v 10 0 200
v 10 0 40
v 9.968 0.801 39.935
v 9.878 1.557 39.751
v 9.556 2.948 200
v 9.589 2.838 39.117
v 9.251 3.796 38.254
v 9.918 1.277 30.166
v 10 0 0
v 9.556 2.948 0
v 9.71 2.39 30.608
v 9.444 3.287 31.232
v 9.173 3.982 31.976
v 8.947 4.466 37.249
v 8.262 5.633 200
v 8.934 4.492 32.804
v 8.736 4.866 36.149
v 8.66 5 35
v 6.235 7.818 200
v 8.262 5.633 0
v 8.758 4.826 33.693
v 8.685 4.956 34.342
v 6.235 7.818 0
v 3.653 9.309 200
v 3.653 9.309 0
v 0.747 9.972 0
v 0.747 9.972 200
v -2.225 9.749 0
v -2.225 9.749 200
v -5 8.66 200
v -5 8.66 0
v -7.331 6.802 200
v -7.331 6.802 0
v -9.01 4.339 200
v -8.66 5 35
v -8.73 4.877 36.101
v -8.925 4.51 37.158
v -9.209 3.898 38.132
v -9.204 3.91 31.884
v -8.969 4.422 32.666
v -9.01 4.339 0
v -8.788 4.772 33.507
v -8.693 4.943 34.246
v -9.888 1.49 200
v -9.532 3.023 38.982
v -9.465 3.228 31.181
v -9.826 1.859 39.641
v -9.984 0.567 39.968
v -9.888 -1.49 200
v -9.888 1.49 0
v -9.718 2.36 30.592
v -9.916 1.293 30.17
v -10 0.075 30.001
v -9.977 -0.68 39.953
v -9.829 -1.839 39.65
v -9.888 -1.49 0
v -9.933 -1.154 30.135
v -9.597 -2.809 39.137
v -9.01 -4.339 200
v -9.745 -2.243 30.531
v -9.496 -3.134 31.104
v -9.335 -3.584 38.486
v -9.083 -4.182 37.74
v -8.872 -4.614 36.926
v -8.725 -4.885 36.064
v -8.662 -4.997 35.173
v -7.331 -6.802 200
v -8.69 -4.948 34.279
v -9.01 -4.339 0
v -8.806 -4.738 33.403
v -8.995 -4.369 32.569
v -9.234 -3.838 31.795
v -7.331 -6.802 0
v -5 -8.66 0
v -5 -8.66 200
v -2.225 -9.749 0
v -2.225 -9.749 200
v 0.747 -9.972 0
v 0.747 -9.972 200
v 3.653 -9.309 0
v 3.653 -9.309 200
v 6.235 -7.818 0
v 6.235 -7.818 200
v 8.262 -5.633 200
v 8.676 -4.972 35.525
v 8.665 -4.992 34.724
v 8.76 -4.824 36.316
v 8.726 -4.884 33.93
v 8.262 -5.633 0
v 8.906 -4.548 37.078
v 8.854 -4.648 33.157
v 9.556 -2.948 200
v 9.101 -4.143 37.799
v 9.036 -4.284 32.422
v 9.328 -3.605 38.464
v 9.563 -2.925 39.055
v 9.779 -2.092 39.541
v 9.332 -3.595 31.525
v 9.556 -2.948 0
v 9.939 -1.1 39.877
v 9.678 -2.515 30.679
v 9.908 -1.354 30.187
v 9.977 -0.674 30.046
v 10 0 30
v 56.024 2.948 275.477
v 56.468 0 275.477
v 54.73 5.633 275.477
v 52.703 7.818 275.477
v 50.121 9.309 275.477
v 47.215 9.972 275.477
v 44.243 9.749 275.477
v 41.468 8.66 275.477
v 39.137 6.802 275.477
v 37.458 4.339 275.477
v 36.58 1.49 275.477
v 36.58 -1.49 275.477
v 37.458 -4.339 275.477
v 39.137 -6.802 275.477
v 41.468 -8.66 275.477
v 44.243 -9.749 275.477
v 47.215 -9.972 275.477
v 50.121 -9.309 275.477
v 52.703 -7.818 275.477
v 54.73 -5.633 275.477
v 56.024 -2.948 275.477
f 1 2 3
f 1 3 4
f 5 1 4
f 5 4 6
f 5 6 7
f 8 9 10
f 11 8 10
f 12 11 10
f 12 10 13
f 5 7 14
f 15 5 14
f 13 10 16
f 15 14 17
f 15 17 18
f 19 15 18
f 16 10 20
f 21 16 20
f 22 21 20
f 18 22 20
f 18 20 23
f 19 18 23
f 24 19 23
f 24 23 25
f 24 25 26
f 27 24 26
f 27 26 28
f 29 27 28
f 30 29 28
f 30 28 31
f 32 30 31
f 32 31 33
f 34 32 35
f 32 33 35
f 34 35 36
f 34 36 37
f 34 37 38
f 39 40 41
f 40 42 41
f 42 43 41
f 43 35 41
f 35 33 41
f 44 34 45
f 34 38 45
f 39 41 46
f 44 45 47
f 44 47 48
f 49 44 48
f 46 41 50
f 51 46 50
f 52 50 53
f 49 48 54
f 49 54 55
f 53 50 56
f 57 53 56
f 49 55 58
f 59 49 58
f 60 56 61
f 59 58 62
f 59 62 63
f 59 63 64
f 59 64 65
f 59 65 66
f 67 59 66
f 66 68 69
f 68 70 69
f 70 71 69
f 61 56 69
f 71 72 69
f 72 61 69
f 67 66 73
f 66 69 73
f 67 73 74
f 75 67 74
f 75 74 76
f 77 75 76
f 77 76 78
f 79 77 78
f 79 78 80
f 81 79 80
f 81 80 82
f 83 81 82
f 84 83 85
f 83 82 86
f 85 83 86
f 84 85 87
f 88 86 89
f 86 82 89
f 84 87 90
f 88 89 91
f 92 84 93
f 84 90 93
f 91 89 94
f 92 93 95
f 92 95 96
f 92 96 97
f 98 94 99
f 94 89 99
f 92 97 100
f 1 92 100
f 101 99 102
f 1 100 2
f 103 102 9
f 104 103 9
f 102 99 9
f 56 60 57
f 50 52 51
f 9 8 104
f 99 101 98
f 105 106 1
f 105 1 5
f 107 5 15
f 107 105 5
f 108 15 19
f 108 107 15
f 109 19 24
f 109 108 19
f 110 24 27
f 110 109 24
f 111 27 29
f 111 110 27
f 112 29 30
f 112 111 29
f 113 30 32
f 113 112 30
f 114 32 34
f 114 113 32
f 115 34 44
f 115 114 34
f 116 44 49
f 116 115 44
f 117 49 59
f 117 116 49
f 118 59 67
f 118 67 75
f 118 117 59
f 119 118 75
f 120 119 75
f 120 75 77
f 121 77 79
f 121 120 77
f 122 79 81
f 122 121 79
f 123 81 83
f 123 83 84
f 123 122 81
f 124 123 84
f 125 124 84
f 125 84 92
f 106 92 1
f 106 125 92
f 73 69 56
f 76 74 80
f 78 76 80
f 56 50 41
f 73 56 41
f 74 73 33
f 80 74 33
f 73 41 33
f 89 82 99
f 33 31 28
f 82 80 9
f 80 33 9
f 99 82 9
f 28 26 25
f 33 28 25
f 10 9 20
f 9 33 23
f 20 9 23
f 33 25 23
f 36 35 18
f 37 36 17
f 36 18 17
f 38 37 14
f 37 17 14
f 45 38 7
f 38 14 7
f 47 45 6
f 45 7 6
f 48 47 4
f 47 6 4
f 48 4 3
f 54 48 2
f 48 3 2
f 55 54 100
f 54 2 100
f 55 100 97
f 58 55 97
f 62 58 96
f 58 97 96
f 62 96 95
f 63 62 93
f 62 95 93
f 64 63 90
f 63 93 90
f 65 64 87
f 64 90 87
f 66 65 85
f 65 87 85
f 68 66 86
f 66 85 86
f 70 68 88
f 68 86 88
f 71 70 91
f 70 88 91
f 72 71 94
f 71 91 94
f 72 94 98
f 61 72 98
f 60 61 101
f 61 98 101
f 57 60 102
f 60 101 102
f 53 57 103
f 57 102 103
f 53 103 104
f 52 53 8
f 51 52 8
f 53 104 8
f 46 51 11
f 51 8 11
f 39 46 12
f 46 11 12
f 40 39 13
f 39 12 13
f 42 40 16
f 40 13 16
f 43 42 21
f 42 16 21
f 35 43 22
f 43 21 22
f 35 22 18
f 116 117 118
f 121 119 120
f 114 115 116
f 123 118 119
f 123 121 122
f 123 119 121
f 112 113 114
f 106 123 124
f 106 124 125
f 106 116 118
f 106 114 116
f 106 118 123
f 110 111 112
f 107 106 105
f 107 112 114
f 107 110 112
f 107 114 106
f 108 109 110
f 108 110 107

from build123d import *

# Parameters (mm, degrees)
F0_R      = 10
F1_DEPTH  = 200
F2_R      = 5
F3_DEPTH  = 12.5
F1_FACE_R = 10


with BuildPart() as f1:
    # F0 (on Top) → F1 (new body)
    with BuildSketch(Plane.XY):
        Circle(F0_R)
    extrude(amount=F1_DEPTH)

    # F2 (on Right) → F3 (cut, symmetric)
    with BuildSketch(Plane.YZ):
        with Locations((0, 35)):
            Circle(F2_R)
    extrude(amount=F3_DEPTH, both=True, mode=Mode.SUBTRACT)

    # F5: sweep along a path in F4
    with BuildLine(Plane.XZ) as f5_path:
        Line((0, 200), (46.467885375, 275.4771232605))
    # F1_face (on face) → F5 (sweep)
    with BuildSketch(Plane.XY.offset(200)):
        Circle(F1_FACE_R)
    sweep(path=f5_path.line)


solid = f1.part
